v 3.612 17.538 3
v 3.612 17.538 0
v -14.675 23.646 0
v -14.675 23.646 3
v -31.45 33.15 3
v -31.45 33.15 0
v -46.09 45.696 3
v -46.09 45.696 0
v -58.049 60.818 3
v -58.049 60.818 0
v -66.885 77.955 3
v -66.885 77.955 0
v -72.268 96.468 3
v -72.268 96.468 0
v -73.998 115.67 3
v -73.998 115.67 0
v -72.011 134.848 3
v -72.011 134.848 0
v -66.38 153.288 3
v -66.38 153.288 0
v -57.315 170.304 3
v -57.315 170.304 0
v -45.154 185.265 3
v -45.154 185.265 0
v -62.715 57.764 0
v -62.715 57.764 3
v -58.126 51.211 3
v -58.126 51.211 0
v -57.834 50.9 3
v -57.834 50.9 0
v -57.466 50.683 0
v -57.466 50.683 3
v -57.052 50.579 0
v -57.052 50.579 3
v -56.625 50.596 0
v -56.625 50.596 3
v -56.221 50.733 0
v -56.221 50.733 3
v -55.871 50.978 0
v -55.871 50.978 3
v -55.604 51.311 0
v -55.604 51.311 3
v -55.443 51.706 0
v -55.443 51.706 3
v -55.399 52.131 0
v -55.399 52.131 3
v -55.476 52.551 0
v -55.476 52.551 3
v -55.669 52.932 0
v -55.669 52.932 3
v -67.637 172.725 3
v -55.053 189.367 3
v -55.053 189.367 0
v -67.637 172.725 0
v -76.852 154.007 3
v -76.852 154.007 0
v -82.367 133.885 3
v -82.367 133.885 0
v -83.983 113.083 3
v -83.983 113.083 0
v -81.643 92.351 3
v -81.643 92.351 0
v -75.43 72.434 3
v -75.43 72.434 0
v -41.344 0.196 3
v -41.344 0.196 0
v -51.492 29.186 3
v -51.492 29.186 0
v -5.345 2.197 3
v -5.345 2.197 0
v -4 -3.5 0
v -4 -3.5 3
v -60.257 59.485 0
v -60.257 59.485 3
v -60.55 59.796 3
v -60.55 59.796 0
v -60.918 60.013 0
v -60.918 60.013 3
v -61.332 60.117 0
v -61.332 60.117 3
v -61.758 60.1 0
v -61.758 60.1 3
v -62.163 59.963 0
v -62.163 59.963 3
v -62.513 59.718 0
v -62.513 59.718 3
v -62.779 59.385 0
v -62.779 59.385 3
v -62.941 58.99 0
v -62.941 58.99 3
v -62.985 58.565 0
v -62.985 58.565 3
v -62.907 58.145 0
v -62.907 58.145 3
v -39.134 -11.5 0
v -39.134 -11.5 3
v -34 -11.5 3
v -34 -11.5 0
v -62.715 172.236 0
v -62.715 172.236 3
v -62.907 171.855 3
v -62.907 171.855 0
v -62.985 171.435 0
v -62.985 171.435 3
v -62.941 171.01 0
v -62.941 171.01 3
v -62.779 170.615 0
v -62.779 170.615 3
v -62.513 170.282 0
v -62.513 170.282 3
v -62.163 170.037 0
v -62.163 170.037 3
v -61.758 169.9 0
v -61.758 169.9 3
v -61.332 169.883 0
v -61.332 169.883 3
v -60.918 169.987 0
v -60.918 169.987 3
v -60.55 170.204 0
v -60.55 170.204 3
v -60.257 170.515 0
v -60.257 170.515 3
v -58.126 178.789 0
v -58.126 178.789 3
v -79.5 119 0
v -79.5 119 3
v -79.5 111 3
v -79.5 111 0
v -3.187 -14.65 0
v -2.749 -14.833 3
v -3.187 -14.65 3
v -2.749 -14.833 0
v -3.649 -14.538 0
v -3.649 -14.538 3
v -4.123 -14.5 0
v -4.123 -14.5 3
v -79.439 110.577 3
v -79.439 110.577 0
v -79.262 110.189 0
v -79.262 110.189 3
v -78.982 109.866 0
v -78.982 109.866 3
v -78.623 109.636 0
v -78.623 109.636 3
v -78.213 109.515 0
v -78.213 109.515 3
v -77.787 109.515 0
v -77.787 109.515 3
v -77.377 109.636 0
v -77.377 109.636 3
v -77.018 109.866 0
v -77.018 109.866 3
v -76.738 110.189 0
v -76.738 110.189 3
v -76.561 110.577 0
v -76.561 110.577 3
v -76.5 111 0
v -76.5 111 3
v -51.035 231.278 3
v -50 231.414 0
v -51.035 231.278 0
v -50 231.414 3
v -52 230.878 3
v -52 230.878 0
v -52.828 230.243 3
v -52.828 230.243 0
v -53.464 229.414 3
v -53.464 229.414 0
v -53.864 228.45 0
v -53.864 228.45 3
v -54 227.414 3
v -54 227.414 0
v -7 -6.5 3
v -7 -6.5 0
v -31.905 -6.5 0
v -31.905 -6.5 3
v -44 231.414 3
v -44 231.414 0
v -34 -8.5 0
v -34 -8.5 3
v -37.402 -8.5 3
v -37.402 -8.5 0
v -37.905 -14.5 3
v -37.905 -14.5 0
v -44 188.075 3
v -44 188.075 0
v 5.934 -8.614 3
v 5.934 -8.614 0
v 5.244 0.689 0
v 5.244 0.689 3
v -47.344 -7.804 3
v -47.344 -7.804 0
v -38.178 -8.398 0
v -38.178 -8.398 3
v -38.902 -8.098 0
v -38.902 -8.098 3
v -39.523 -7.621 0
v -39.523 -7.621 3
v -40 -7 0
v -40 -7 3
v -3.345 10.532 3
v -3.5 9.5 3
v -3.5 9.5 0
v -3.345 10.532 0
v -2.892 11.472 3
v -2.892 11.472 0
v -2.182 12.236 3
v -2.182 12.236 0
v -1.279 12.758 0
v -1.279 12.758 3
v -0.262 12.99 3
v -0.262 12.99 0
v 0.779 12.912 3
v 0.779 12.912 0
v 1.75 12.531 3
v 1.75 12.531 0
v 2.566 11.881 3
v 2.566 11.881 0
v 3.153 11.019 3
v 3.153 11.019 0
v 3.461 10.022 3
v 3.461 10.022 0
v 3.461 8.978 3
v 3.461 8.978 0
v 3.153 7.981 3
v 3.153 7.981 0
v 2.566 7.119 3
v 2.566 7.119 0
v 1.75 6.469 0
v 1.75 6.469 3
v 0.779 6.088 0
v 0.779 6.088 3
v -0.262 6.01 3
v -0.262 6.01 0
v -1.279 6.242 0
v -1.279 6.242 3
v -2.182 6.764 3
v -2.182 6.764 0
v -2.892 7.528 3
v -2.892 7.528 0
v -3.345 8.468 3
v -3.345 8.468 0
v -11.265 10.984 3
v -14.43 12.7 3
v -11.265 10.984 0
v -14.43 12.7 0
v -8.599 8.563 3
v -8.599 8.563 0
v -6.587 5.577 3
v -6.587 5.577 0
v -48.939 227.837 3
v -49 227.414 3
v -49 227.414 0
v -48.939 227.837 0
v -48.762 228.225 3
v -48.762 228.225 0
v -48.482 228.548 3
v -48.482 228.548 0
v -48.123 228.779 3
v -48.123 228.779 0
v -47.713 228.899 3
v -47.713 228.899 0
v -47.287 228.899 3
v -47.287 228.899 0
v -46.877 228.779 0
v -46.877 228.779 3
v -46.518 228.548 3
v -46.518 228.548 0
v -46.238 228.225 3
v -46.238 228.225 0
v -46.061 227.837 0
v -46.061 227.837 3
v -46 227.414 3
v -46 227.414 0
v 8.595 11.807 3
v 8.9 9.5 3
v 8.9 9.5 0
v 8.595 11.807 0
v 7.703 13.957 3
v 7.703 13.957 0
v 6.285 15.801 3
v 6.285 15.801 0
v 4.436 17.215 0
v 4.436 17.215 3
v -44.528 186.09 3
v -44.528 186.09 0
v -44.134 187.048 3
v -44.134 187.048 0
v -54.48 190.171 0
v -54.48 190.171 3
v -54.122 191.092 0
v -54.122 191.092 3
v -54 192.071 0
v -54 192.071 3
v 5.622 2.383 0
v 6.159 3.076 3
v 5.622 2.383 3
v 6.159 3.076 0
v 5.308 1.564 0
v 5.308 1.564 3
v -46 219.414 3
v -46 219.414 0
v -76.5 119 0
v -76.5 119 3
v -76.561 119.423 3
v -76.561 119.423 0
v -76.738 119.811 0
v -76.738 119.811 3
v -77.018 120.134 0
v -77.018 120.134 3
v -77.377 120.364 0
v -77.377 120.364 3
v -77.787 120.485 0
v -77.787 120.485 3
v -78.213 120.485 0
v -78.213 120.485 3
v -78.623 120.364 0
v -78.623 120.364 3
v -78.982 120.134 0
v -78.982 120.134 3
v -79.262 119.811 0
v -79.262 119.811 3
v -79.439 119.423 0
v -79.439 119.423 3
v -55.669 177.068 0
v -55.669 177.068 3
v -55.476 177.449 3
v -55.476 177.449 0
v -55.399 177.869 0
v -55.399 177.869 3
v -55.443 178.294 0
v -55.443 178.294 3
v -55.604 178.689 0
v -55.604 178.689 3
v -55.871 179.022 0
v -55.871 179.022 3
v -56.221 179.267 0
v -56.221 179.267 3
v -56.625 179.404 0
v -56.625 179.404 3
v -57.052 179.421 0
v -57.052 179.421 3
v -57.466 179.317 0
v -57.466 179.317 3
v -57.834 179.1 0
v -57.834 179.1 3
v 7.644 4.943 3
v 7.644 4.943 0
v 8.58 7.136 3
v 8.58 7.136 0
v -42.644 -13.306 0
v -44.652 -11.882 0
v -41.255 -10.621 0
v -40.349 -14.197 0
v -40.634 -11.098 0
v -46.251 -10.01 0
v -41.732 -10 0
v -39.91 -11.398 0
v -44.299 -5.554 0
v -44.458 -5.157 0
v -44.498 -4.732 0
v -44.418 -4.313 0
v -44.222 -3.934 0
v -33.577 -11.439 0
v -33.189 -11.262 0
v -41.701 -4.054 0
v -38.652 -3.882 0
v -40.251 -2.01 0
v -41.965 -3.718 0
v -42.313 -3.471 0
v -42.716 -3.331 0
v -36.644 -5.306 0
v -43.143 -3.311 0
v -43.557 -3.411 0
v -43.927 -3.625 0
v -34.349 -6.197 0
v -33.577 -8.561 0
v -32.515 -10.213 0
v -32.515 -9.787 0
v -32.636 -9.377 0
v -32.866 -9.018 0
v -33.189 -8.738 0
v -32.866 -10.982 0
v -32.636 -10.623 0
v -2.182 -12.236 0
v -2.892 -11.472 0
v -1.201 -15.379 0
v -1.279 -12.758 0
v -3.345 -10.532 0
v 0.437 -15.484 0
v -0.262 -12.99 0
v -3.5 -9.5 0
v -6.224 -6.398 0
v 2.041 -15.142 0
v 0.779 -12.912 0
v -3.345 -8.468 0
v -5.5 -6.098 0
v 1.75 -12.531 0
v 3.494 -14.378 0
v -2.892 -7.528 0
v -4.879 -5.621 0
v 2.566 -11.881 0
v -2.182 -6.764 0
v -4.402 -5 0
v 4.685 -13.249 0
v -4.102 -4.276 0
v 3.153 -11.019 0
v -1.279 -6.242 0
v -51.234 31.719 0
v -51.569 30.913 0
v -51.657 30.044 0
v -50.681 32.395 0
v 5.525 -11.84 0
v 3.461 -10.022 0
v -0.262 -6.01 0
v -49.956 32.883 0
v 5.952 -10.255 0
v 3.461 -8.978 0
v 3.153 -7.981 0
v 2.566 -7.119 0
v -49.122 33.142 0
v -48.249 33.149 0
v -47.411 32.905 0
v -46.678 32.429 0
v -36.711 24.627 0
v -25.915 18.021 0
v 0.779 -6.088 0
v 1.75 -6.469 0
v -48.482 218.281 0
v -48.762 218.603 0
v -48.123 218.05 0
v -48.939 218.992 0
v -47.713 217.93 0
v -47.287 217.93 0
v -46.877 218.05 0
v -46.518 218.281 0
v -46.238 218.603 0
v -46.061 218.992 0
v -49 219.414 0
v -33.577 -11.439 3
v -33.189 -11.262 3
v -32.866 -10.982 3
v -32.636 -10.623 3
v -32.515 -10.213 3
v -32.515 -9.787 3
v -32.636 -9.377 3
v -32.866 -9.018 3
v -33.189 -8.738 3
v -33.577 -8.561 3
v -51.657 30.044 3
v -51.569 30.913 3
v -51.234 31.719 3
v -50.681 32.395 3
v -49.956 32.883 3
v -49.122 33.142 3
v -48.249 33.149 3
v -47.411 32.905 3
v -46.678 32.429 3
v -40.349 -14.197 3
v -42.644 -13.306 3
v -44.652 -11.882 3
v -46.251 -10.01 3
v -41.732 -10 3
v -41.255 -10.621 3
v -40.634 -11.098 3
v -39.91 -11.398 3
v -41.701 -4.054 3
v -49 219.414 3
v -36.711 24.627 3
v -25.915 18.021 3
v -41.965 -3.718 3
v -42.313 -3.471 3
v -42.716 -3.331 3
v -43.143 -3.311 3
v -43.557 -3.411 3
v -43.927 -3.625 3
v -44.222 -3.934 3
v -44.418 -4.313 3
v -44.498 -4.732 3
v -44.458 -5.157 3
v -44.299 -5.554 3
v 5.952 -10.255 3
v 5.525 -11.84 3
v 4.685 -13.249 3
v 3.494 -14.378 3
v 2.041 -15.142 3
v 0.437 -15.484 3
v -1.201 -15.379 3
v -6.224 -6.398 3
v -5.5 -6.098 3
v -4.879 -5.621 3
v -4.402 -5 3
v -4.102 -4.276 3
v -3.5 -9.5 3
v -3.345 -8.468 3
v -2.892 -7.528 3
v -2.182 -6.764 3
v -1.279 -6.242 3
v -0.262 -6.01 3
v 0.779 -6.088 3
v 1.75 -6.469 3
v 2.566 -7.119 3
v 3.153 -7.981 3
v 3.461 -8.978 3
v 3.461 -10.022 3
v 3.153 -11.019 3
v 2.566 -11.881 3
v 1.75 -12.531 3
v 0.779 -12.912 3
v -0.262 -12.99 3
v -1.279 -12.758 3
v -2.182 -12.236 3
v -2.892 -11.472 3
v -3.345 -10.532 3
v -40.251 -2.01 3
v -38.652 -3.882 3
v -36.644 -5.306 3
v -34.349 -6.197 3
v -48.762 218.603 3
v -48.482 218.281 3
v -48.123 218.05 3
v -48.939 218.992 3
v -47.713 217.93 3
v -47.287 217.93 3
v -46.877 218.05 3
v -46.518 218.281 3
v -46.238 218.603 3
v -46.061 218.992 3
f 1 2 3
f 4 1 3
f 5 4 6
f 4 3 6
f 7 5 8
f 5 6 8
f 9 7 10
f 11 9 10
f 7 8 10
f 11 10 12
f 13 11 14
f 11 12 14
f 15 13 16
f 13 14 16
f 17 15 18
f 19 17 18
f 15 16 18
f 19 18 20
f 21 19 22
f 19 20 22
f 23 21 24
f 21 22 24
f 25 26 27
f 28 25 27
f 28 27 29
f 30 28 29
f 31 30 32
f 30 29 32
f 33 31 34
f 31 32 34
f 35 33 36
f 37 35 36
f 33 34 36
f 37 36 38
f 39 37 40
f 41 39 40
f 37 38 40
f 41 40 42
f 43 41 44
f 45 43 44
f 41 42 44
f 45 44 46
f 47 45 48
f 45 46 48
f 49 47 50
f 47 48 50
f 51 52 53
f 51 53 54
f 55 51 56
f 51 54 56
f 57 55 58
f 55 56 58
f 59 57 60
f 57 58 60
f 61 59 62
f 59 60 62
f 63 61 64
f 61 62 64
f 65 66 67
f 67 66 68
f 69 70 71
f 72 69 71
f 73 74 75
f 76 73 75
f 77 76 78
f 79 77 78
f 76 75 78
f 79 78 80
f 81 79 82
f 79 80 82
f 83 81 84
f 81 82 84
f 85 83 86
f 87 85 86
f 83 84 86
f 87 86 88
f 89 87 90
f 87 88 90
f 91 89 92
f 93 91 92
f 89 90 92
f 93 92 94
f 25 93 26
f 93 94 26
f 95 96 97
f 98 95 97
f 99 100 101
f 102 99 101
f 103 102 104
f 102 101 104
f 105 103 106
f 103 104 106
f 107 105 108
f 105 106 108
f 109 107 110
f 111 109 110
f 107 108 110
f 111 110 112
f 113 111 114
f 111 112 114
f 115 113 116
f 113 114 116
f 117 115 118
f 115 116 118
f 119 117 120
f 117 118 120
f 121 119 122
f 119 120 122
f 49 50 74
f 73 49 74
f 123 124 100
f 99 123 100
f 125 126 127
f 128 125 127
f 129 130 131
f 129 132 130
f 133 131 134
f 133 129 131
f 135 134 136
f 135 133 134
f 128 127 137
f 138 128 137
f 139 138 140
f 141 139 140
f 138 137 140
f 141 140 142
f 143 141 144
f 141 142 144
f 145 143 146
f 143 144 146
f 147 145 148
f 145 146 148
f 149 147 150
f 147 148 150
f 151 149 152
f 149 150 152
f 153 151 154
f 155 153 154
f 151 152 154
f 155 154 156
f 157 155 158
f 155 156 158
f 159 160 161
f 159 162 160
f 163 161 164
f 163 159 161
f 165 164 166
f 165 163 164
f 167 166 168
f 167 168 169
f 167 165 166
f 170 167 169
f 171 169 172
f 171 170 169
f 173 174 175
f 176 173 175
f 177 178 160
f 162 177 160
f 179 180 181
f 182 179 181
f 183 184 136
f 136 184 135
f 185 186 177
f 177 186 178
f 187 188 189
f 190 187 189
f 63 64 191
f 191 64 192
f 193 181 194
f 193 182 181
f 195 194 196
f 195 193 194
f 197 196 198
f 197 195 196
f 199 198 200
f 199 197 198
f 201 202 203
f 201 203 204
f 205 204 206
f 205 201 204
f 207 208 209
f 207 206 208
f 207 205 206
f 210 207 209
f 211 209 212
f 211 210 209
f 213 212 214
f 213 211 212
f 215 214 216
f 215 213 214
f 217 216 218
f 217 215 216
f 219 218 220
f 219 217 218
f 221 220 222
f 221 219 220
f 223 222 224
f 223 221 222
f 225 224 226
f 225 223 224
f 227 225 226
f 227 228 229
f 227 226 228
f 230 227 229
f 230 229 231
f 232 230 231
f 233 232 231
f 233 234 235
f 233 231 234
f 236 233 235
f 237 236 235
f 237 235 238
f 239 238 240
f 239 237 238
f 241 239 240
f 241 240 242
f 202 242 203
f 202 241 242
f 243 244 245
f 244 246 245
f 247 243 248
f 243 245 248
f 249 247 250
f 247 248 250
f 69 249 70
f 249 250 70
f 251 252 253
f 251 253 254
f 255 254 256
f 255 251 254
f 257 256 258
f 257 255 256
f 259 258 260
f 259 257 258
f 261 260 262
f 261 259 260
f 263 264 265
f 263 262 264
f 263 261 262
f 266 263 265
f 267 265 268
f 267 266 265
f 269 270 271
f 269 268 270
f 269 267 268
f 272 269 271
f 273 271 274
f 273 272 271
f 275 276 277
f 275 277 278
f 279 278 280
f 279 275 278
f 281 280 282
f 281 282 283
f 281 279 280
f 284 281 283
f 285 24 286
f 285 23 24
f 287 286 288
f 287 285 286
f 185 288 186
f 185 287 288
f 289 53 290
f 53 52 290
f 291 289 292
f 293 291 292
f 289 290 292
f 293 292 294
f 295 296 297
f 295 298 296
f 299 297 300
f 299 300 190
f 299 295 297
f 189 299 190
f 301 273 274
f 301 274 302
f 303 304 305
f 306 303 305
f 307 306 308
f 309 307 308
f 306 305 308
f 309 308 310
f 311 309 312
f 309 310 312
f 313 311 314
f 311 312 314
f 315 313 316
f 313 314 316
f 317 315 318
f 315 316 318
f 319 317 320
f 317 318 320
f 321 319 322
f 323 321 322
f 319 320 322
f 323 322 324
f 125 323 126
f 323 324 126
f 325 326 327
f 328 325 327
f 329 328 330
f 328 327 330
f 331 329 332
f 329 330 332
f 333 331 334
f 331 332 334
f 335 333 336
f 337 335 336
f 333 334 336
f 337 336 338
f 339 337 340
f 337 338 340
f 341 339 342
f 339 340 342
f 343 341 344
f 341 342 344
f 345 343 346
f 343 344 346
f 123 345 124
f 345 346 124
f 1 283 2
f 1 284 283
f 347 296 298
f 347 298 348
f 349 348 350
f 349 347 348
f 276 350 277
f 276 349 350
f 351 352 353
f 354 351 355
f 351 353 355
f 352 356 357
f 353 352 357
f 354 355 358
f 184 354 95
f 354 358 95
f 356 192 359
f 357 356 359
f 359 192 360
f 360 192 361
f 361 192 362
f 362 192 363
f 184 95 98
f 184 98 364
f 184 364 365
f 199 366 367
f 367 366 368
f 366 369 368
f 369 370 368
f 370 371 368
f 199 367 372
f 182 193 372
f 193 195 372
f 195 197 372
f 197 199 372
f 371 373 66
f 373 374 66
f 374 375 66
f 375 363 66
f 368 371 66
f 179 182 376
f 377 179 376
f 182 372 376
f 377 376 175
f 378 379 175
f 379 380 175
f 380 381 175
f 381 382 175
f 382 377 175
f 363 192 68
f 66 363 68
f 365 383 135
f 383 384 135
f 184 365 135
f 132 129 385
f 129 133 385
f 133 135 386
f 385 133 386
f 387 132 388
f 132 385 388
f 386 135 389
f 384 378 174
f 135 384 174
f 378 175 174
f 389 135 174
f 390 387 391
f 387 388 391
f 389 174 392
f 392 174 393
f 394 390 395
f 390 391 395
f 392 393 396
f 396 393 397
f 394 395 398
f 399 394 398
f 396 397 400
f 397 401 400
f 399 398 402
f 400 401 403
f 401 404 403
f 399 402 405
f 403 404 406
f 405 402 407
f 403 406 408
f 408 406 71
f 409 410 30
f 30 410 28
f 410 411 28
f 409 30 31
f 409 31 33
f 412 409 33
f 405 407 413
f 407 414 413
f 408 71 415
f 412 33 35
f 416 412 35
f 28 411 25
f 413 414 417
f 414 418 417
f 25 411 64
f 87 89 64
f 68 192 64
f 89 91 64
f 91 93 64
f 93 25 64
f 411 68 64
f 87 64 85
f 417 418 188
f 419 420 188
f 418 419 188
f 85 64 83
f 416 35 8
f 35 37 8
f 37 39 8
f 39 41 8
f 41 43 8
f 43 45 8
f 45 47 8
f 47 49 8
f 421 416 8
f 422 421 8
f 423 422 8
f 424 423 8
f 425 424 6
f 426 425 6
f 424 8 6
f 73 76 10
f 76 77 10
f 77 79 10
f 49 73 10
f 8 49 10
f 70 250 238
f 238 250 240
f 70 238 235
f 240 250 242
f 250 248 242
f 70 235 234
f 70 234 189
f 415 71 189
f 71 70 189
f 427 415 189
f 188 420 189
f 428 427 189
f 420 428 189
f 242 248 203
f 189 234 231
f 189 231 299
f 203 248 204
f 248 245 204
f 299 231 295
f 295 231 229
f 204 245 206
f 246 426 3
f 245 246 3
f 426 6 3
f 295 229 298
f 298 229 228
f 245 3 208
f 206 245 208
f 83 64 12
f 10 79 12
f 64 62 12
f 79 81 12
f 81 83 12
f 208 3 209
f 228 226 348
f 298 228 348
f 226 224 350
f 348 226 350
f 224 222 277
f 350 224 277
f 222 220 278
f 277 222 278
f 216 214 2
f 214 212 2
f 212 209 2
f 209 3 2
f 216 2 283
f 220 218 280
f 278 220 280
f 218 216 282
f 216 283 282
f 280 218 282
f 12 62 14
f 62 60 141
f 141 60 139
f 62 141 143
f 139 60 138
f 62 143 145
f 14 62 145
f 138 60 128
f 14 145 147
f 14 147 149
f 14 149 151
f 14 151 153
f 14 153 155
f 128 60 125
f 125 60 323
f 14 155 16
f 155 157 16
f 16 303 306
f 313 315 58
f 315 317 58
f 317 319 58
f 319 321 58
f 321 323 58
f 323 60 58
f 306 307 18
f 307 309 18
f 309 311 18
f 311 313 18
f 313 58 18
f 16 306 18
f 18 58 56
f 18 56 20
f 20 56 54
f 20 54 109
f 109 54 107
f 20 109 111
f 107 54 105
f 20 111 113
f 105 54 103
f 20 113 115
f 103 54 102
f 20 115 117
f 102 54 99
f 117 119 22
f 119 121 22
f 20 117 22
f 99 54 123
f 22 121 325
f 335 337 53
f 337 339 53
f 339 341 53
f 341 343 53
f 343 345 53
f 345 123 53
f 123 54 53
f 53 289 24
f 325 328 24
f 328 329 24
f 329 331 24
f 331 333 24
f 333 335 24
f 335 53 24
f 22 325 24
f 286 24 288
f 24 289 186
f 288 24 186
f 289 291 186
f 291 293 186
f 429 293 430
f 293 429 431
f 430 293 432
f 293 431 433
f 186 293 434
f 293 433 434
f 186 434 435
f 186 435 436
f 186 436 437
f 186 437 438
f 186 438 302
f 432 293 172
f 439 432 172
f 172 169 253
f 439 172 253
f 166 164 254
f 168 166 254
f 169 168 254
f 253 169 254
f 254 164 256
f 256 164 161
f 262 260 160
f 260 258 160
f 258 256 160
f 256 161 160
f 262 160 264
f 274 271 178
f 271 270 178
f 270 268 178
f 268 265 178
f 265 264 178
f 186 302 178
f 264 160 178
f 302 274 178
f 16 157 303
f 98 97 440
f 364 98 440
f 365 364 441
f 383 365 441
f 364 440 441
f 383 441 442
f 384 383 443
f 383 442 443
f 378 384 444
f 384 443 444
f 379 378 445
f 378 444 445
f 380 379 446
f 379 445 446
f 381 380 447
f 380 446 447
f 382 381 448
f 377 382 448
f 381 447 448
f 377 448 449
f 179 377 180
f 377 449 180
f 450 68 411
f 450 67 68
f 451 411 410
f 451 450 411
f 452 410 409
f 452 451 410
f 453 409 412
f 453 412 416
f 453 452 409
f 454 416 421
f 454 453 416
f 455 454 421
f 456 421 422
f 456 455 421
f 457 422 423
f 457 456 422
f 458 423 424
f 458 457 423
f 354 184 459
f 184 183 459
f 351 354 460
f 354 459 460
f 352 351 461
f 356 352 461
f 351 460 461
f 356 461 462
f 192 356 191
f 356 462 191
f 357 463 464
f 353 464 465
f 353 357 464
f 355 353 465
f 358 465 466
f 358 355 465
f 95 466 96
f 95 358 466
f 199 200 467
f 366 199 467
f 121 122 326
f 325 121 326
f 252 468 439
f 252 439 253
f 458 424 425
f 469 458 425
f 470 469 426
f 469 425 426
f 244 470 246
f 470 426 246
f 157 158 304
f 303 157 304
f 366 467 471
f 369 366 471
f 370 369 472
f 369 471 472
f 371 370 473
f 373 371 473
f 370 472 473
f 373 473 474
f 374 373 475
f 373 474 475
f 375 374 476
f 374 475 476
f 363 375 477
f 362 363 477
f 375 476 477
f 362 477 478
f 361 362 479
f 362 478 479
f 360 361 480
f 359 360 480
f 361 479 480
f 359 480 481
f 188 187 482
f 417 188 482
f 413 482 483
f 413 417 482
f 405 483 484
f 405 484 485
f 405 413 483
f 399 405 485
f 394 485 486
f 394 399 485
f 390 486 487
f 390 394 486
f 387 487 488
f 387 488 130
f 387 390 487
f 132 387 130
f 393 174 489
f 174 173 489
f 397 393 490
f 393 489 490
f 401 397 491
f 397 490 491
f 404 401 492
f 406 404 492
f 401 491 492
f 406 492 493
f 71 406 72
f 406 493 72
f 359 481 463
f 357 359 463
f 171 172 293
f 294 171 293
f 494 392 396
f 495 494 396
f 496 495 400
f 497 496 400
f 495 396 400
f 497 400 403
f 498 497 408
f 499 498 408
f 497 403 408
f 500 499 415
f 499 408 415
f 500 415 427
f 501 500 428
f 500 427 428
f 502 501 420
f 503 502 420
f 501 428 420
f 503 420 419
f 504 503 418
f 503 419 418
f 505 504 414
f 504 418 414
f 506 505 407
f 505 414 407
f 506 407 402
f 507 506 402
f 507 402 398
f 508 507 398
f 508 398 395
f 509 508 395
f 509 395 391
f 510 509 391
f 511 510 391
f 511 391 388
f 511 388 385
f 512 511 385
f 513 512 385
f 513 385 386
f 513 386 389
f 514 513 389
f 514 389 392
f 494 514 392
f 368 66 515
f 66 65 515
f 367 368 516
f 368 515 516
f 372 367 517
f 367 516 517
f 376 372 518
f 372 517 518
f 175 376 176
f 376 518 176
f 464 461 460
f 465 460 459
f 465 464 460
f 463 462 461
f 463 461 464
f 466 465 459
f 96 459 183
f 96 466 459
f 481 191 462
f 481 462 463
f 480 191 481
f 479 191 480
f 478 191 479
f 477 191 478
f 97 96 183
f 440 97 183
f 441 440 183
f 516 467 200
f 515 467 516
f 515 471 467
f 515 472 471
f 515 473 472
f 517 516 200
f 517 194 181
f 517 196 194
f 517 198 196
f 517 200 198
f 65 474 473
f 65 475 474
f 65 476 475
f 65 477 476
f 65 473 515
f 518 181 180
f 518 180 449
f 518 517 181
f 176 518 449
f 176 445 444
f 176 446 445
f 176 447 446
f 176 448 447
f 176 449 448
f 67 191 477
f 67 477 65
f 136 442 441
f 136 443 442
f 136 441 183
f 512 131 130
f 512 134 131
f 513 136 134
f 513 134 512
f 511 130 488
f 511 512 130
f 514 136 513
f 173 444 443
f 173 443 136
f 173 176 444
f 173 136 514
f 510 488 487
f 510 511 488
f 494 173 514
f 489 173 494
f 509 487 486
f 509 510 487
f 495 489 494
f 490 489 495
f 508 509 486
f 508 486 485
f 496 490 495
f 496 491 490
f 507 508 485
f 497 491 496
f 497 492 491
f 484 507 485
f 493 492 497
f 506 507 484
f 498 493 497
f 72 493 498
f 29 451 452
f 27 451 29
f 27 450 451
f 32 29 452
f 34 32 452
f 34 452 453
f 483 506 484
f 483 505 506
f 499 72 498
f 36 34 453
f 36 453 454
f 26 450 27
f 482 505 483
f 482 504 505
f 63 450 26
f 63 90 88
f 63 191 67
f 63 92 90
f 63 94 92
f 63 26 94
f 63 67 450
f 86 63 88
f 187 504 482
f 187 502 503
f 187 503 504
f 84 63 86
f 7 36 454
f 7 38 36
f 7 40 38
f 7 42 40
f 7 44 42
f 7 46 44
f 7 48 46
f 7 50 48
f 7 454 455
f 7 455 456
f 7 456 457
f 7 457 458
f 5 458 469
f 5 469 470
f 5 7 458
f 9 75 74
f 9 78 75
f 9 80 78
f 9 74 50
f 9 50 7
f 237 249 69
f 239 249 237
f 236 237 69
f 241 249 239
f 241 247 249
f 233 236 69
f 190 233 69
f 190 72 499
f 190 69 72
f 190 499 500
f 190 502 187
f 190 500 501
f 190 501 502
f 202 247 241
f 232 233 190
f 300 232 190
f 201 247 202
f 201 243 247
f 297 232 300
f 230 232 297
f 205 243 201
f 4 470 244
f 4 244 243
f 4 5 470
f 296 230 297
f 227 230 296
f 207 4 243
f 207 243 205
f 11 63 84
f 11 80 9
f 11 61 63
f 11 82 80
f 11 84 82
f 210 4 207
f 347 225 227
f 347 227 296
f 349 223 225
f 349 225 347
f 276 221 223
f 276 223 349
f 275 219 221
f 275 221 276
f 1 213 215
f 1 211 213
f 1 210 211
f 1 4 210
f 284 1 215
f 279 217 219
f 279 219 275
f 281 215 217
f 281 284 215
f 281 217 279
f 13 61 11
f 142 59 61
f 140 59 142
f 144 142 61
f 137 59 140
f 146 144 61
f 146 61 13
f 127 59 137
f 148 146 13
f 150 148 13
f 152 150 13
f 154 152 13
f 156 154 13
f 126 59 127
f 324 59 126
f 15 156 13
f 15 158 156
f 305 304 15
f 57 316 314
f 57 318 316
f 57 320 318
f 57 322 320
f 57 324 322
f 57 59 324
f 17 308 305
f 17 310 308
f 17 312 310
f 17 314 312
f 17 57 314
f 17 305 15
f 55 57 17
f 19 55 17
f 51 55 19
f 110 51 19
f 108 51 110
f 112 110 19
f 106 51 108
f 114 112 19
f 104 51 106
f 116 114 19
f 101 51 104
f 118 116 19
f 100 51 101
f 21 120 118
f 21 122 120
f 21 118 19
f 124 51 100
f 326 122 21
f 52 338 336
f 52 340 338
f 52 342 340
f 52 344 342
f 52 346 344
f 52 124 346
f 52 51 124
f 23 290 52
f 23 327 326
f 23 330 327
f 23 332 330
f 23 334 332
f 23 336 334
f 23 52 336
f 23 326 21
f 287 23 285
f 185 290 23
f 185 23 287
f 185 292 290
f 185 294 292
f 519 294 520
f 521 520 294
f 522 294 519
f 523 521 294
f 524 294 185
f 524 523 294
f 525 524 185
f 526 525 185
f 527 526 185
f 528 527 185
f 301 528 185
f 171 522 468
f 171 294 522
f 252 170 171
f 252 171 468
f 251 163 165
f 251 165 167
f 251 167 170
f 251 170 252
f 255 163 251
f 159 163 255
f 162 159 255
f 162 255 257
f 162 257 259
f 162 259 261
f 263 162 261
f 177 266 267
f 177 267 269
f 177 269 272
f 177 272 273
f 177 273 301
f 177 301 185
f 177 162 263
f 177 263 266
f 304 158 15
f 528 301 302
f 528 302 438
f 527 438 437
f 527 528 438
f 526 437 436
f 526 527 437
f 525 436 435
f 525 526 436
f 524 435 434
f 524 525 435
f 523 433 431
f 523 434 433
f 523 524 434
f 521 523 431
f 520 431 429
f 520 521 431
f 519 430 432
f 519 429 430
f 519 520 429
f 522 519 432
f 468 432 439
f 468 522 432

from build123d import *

# Parameters (mm, degrees)
SKETCH_1_R               = 1.5
EXTRUDE_1_DEPTH          = 3
FILLET_5_R               = 4
EXTRUDE_START            = -3
EXTRUDE_2_DEPTH          = 3
FILLET_7_R               = 3
FILLET_8_R               = 10
SKETCH_3_R               = 1.5
CUT_EXTRUDE_1_DEPTH      = 247.206358511
FILLET_9_R               = 3
CUT_EXTRUDE_2_DEPTH      = 9.5
FILLET_10_R              = 3
CUT_EXTRUDE_3_DEPTH      = 9.5
CUT_EXTRUDE_4_DEPTH      = 247.206358511
SKETCH_7_R               = 3.5
SKETCH_7_R_2             = 1.5
CUT_EXTRUDE_5_DEPTH      = 55
SKETCH_8_R               = 6
SKETCH_8_R_2             = 3.5
EXTRUDE_3_DEPTH          = 3
EXTRUDE_5_DEPTH          = 3
CUT_EXTRUDE_6_DEPTH      = 247.206358511
CUT_EXTRUDE_6_DEPTH_BACK = 247.206358511
SKETCH_12_R              = 3.5
FILLET_13_R              = 3
EXTRUDE_6_DEPTH          = 3
FILLET_14_R              = 3
FILLET_15_R              = 15


with BuildPart() as part:
    # 草图1 → 凸台-拉伸1 (new body)
    with BuildSketch(Plane.XY):
        with BuildLine():
            Line((4, -6.5), (4, 17.450012814))
            ThreePointArc((4, 17.450012814), (-70.193717354, 87.672930243), (-44, 186.414284285))
            Line((-44, 186.414284285), (-44, 231.414284285))
            Line((-44, 231.414284285), (-54, 231.414284285))
            Line((-54, 231.414284285), (-54, 190.498344353))
            ThreePointArc((-54, 190.498344353), (-80.042429579, 85.759563462), (-4, 9.169947557))
            Line((-4, 9.169947557), (-4, -6.5))
            ThreePointArc((-4, -6.5), (0, -14.5), (4, -6.5))
        make_face()
        with BuildLine():
            ThreePointArc((-1.5, -9.5), (0, -8), (1.5, -9.5))
            Line((1.5, -9.5), (-1.5, -9.5))
        make_face(mode=Mode.SUBTRACT)
        with Locations((0, 9.5)):
            Circle(SKETCH_1_R, mode=Mode.SUBTRACT)
    extrude(amount=EXTRUDE_1_DEPTH)

    # 圆角5
    fillet_5_edges = [part.edges().sort_by_distance(p)[0] for p in [
        (-54, 190.498344353, 1.5),
        (-54, 231.414284285, 1.5),
        (-44, 186.414284285, 1.5),
    ]]
    fillet(fillet_5_edges, radius=FILLET_5_R)

    # 草图2 → 凸台-拉伸2 (add)
    with BuildSketch(Plane.XY.offset(3).offset(EXTRUDE_START)):
        with BuildLine():
            Line((-45, -14.5), (0, -14.5))
            ThreePointArc((0, -14.5), (-4.472135955, -11.736067977), (-4, -6.5))
            Line((-4, -6.5), (-39, -6.5))
            Line((-39, -6.5), (-55.777803301, 41.431046717))
            ThreePointArc((-55.777803301, 41.431046717), (-66.906324005, 56.106749454), (-75.43024107, 72.433508525))
            Line((-75.43024107, 72.433508525), (-45, -14.5))
        make_face()
    extrude(amount=EXTRUDE_2_DEPTH)

    # 圆角7
    fillet_7_edges = [part.edges().sort_by_distance(p)[0] for p in [
        (-55.777803301, 41.431046717, 1.5),
    ]]
    fillet(fillet_7_edges, radius=FILLET_7_R)

    # 圆角8
    fillet_8_edges = [part.edges().sort_by_distance(p)[0] for p in [
        (-39, -6.5, 1.5),
        (-45, -14.5, 1.5),
    ]]
    fillet(fillet_8_edges, radius=FILLET_8_R)

    # 草图3 → 切除-拉伸1 (cut, through all)
    with BuildSketch(Plane.XY.offset(3)):
        with Locations((0, -9.5)):
            Circle(SKETCH_3_R)
    extrude(amount=-CUT_EXTRUDE_1_DEPTH, mode=Mode.SUBTRACT)

    # 圆角9
    fillet_9_edges = [part.edges().sort_by_distance(p)[0] for p in [
        (4, -6.5, 1.5),
        (-4, -6.5, 1.5),
    ]]
    fillet(fillet_9_edges, radius=FILLET_9_R)

    # 草图4 → 切除-拉伸2 (cut)
    with BuildSketch(Plane.XY.offset(3)):
        with BuildLine():
            Line((-34, -8.5), (-39.133974596, -8.5))
            Line((-39.133974596, -8.5), (-41.700961894, -4.053847577))
            ThreePointArc((-41.700961894, -4.053847577), (-43.75, -3.504809472), (-44.299038106, -5.553847577))
            Line((-44.299038106, -5.553847577), (-40.866025404, -11.5))
            Line((-40.866025404, -11.5), (-34, -11.5))
            ThreePointArc((-34, -11.5), (-32.5, -10), (-34, -8.5))
        make_face()
    extrude(amount=-CUT_EXTRUDE_2_DEPTH, mode=Mode.SUBTRACT)

    # 圆角10
    fillet_10_edges = [part.edges().sort_by_distance(p)[0] for p in [
        (-40.866025404, -11.5, 1.5),
        (-39.133974596, -8.5, 1.5),
    ]]
    fillet(fillet_10_edges, radius=FILLET_10_R)

    # 草图5 → 切除-拉伸3 (cut)
    with BuildSketch(Plane.XY.offset(3)):
        with BuildLine():
            Line((-58.126234927, 178.788922212), (-62.714846418, 172.235705858))
            ThreePointArc((-62.714846418, 172.235705858), (-62.346483006, 170.146613137), (-60.257390285, 170.514976549))
            Line((-60.257390285, 170.514976549), (-55.668778794, 177.068192903))
            ThreePointArc((-55.668778794, 177.068192903), (-56.037142206, 179.157285624), (-58.126234927, 178.788922212))
        make_face()
        with BuildLine():
            Line((-79.5, 119), (-79.5, 111))
            ThreePointArc((-79.5, 111), (-78, 109.5), (-76.5, 111))
            Line((-76.5, 111), (-76.5, 119))
            ThreePointArc((-76.5, 119), (-78, 120.5), (-79.5, 119))
        make_face()
        with BuildLine():
            Line((-62.714846418, 57.764294142), (-58.126234927, 51.211077788))
            ThreePointArc((-58.126234927, 51.211077788), (-56.037142206, 50.842714376), (-55.668778794, 52.931807097))
            Line((-55.668778794, 52.931807097), (-60.257390285, 59.485023451))
            ThreePointArc((-60.257390285, 59.485023451), (-62.346483006, 59.853386863), (-62.714846418, 57.764294142))
        make_face()
    extrude(amount=-CUT_EXTRUDE_3_DEPTH, mode=Mode.SUBTRACT)

    # 草图6 → 切除-拉伸4 (cut, through all)
    with BuildSketch(Plane.XY.offset(3)):
        with BuildLine():
            Line((-49, 219.414284285), (-49, 227.414284285))
            ThreePointArc((-49, 227.414284285), (-47.5, 228.914284285), (-46, 227.414284285))
            Line((-46, 227.414284285), (-46, 219.414284285))
            ThreePointArc((-46, 219.414284285), (-47.5, 217.914284285), (-49, 219.414284285))
        make_face()
    extrude(amount=-CUT_EXTRUDE_4_DEPTH, mode=Mode.SUBTRACT)

    # 草图7 → 切除-拉伸5 (cut)
    with BuildSketch(Plane(origin=(0, 0, 0), x_dir=(-1, 0, 0), z_dir=(0, 0, -1))):
        with Locations((0, -9.5)):
            Circle(SKETCH_7_R)
        with Locations((0, -9.5)):
            Circle(SKETCH_7_R_2, mode=Mode.SUBTRACT)
    extrude(amount=-CUT_EXTRUDE_5_DEPTH, mode=Mode.SUBTRACT)

    # 草图8 → 凸台-拉伸3 (add)
    with BuildSketch(Plane(origin=(0, 0, 0), x_dir=(-1, 0, 0), z_dir=(0, 0, -1))):
        with Locations((0, -9.5)):
            Circle(SKETCH_8_R)
        with Locations((0, -9.5)):
            Circle(SKETCH_8_R_2, mode=Mode.SUBTRACT)
    extrude(amount=-EXTRUDE_3_DEPTH)

    # 草图11 → 凸台-拉伸5 (add)
    with BuildSketch(Plane(origin=(0, 0, 0), x_dir=(-1, 0, 0), z_dir=(0, 0, -1))):
        Polygon((-4, 17.450012814), (-4, -5.027864045), (-6, -9.5), align=None)
        Polygon((4, -3.5), (4, 9.169947557), (7.464101615, 11.169947557), align=None)
    extrude(amount=-EXTRUDE_5_DEPTH)

    # 草图12 → 切除-拉伸6 (cut, two sides: drawn at the far end of the back side and taken through both)
    with BuildSketch(Plane(origin=(0, 0, 0), x_dir=(-1, 0, 0), z_dir=(0, 0, -1)).offset(-CUT_EXTRUDE_6_DEPTH_BACK)):
        with Locations((0, 9.5)):
            Circle(SKETCH_12_R)
    extrude(amount=CUT_EXTRUDE_6_DEPTH + CUT_EXTRUDE_6_DEPTH_BACK, mode=Mode.SUBTRACT)

    # 圆角13
    fillet_13_edges = [part.edges().sort_by_distance(p)[0] for p in [
        (-3.31662479, -14.5, 1.5),
    ]]
    fillet(fillet_13_edges, radius=FILLET_13_R)

    # 草图13 → 凸台-拉伸6 (add)
    with BuildSketch(Plane.XY.offset(3)):
        with BuildLine():
            ThreePointArc((8.899590088, 9.5), (7.576313883, 14.169279569), (4, 17.450012814))
            Line((4, 17.450012814), (5.129683944, 2.227514429))
            ThreePointArc((5.129683944, 2.227514429), (7.901100813, 5.404232712), (8.899590088, 9.5))
        make_face()
    extrude(amount=-EXTRUDE_6_DEPTH)

    # 圆角14
    fillet_14_edges = [part.edges().sort_by_distance(p)[0] for p in [
        (4, 17.450012814, 1.5),
        (5.129683944, 2.227514429, 1.5),
    ]]
    fillet(fillet_14_edges, radius=FILLET_14_R)

    # 圆角15
    fillet_15_edges = [part.edges().sort_by_distance(p)[0] for p in [
        (-7.219978098, 10.136121304, 1.5),
    ]]
    fillet(fillet_15_edges, radius=FILLET_15_R)


solid = part.part
